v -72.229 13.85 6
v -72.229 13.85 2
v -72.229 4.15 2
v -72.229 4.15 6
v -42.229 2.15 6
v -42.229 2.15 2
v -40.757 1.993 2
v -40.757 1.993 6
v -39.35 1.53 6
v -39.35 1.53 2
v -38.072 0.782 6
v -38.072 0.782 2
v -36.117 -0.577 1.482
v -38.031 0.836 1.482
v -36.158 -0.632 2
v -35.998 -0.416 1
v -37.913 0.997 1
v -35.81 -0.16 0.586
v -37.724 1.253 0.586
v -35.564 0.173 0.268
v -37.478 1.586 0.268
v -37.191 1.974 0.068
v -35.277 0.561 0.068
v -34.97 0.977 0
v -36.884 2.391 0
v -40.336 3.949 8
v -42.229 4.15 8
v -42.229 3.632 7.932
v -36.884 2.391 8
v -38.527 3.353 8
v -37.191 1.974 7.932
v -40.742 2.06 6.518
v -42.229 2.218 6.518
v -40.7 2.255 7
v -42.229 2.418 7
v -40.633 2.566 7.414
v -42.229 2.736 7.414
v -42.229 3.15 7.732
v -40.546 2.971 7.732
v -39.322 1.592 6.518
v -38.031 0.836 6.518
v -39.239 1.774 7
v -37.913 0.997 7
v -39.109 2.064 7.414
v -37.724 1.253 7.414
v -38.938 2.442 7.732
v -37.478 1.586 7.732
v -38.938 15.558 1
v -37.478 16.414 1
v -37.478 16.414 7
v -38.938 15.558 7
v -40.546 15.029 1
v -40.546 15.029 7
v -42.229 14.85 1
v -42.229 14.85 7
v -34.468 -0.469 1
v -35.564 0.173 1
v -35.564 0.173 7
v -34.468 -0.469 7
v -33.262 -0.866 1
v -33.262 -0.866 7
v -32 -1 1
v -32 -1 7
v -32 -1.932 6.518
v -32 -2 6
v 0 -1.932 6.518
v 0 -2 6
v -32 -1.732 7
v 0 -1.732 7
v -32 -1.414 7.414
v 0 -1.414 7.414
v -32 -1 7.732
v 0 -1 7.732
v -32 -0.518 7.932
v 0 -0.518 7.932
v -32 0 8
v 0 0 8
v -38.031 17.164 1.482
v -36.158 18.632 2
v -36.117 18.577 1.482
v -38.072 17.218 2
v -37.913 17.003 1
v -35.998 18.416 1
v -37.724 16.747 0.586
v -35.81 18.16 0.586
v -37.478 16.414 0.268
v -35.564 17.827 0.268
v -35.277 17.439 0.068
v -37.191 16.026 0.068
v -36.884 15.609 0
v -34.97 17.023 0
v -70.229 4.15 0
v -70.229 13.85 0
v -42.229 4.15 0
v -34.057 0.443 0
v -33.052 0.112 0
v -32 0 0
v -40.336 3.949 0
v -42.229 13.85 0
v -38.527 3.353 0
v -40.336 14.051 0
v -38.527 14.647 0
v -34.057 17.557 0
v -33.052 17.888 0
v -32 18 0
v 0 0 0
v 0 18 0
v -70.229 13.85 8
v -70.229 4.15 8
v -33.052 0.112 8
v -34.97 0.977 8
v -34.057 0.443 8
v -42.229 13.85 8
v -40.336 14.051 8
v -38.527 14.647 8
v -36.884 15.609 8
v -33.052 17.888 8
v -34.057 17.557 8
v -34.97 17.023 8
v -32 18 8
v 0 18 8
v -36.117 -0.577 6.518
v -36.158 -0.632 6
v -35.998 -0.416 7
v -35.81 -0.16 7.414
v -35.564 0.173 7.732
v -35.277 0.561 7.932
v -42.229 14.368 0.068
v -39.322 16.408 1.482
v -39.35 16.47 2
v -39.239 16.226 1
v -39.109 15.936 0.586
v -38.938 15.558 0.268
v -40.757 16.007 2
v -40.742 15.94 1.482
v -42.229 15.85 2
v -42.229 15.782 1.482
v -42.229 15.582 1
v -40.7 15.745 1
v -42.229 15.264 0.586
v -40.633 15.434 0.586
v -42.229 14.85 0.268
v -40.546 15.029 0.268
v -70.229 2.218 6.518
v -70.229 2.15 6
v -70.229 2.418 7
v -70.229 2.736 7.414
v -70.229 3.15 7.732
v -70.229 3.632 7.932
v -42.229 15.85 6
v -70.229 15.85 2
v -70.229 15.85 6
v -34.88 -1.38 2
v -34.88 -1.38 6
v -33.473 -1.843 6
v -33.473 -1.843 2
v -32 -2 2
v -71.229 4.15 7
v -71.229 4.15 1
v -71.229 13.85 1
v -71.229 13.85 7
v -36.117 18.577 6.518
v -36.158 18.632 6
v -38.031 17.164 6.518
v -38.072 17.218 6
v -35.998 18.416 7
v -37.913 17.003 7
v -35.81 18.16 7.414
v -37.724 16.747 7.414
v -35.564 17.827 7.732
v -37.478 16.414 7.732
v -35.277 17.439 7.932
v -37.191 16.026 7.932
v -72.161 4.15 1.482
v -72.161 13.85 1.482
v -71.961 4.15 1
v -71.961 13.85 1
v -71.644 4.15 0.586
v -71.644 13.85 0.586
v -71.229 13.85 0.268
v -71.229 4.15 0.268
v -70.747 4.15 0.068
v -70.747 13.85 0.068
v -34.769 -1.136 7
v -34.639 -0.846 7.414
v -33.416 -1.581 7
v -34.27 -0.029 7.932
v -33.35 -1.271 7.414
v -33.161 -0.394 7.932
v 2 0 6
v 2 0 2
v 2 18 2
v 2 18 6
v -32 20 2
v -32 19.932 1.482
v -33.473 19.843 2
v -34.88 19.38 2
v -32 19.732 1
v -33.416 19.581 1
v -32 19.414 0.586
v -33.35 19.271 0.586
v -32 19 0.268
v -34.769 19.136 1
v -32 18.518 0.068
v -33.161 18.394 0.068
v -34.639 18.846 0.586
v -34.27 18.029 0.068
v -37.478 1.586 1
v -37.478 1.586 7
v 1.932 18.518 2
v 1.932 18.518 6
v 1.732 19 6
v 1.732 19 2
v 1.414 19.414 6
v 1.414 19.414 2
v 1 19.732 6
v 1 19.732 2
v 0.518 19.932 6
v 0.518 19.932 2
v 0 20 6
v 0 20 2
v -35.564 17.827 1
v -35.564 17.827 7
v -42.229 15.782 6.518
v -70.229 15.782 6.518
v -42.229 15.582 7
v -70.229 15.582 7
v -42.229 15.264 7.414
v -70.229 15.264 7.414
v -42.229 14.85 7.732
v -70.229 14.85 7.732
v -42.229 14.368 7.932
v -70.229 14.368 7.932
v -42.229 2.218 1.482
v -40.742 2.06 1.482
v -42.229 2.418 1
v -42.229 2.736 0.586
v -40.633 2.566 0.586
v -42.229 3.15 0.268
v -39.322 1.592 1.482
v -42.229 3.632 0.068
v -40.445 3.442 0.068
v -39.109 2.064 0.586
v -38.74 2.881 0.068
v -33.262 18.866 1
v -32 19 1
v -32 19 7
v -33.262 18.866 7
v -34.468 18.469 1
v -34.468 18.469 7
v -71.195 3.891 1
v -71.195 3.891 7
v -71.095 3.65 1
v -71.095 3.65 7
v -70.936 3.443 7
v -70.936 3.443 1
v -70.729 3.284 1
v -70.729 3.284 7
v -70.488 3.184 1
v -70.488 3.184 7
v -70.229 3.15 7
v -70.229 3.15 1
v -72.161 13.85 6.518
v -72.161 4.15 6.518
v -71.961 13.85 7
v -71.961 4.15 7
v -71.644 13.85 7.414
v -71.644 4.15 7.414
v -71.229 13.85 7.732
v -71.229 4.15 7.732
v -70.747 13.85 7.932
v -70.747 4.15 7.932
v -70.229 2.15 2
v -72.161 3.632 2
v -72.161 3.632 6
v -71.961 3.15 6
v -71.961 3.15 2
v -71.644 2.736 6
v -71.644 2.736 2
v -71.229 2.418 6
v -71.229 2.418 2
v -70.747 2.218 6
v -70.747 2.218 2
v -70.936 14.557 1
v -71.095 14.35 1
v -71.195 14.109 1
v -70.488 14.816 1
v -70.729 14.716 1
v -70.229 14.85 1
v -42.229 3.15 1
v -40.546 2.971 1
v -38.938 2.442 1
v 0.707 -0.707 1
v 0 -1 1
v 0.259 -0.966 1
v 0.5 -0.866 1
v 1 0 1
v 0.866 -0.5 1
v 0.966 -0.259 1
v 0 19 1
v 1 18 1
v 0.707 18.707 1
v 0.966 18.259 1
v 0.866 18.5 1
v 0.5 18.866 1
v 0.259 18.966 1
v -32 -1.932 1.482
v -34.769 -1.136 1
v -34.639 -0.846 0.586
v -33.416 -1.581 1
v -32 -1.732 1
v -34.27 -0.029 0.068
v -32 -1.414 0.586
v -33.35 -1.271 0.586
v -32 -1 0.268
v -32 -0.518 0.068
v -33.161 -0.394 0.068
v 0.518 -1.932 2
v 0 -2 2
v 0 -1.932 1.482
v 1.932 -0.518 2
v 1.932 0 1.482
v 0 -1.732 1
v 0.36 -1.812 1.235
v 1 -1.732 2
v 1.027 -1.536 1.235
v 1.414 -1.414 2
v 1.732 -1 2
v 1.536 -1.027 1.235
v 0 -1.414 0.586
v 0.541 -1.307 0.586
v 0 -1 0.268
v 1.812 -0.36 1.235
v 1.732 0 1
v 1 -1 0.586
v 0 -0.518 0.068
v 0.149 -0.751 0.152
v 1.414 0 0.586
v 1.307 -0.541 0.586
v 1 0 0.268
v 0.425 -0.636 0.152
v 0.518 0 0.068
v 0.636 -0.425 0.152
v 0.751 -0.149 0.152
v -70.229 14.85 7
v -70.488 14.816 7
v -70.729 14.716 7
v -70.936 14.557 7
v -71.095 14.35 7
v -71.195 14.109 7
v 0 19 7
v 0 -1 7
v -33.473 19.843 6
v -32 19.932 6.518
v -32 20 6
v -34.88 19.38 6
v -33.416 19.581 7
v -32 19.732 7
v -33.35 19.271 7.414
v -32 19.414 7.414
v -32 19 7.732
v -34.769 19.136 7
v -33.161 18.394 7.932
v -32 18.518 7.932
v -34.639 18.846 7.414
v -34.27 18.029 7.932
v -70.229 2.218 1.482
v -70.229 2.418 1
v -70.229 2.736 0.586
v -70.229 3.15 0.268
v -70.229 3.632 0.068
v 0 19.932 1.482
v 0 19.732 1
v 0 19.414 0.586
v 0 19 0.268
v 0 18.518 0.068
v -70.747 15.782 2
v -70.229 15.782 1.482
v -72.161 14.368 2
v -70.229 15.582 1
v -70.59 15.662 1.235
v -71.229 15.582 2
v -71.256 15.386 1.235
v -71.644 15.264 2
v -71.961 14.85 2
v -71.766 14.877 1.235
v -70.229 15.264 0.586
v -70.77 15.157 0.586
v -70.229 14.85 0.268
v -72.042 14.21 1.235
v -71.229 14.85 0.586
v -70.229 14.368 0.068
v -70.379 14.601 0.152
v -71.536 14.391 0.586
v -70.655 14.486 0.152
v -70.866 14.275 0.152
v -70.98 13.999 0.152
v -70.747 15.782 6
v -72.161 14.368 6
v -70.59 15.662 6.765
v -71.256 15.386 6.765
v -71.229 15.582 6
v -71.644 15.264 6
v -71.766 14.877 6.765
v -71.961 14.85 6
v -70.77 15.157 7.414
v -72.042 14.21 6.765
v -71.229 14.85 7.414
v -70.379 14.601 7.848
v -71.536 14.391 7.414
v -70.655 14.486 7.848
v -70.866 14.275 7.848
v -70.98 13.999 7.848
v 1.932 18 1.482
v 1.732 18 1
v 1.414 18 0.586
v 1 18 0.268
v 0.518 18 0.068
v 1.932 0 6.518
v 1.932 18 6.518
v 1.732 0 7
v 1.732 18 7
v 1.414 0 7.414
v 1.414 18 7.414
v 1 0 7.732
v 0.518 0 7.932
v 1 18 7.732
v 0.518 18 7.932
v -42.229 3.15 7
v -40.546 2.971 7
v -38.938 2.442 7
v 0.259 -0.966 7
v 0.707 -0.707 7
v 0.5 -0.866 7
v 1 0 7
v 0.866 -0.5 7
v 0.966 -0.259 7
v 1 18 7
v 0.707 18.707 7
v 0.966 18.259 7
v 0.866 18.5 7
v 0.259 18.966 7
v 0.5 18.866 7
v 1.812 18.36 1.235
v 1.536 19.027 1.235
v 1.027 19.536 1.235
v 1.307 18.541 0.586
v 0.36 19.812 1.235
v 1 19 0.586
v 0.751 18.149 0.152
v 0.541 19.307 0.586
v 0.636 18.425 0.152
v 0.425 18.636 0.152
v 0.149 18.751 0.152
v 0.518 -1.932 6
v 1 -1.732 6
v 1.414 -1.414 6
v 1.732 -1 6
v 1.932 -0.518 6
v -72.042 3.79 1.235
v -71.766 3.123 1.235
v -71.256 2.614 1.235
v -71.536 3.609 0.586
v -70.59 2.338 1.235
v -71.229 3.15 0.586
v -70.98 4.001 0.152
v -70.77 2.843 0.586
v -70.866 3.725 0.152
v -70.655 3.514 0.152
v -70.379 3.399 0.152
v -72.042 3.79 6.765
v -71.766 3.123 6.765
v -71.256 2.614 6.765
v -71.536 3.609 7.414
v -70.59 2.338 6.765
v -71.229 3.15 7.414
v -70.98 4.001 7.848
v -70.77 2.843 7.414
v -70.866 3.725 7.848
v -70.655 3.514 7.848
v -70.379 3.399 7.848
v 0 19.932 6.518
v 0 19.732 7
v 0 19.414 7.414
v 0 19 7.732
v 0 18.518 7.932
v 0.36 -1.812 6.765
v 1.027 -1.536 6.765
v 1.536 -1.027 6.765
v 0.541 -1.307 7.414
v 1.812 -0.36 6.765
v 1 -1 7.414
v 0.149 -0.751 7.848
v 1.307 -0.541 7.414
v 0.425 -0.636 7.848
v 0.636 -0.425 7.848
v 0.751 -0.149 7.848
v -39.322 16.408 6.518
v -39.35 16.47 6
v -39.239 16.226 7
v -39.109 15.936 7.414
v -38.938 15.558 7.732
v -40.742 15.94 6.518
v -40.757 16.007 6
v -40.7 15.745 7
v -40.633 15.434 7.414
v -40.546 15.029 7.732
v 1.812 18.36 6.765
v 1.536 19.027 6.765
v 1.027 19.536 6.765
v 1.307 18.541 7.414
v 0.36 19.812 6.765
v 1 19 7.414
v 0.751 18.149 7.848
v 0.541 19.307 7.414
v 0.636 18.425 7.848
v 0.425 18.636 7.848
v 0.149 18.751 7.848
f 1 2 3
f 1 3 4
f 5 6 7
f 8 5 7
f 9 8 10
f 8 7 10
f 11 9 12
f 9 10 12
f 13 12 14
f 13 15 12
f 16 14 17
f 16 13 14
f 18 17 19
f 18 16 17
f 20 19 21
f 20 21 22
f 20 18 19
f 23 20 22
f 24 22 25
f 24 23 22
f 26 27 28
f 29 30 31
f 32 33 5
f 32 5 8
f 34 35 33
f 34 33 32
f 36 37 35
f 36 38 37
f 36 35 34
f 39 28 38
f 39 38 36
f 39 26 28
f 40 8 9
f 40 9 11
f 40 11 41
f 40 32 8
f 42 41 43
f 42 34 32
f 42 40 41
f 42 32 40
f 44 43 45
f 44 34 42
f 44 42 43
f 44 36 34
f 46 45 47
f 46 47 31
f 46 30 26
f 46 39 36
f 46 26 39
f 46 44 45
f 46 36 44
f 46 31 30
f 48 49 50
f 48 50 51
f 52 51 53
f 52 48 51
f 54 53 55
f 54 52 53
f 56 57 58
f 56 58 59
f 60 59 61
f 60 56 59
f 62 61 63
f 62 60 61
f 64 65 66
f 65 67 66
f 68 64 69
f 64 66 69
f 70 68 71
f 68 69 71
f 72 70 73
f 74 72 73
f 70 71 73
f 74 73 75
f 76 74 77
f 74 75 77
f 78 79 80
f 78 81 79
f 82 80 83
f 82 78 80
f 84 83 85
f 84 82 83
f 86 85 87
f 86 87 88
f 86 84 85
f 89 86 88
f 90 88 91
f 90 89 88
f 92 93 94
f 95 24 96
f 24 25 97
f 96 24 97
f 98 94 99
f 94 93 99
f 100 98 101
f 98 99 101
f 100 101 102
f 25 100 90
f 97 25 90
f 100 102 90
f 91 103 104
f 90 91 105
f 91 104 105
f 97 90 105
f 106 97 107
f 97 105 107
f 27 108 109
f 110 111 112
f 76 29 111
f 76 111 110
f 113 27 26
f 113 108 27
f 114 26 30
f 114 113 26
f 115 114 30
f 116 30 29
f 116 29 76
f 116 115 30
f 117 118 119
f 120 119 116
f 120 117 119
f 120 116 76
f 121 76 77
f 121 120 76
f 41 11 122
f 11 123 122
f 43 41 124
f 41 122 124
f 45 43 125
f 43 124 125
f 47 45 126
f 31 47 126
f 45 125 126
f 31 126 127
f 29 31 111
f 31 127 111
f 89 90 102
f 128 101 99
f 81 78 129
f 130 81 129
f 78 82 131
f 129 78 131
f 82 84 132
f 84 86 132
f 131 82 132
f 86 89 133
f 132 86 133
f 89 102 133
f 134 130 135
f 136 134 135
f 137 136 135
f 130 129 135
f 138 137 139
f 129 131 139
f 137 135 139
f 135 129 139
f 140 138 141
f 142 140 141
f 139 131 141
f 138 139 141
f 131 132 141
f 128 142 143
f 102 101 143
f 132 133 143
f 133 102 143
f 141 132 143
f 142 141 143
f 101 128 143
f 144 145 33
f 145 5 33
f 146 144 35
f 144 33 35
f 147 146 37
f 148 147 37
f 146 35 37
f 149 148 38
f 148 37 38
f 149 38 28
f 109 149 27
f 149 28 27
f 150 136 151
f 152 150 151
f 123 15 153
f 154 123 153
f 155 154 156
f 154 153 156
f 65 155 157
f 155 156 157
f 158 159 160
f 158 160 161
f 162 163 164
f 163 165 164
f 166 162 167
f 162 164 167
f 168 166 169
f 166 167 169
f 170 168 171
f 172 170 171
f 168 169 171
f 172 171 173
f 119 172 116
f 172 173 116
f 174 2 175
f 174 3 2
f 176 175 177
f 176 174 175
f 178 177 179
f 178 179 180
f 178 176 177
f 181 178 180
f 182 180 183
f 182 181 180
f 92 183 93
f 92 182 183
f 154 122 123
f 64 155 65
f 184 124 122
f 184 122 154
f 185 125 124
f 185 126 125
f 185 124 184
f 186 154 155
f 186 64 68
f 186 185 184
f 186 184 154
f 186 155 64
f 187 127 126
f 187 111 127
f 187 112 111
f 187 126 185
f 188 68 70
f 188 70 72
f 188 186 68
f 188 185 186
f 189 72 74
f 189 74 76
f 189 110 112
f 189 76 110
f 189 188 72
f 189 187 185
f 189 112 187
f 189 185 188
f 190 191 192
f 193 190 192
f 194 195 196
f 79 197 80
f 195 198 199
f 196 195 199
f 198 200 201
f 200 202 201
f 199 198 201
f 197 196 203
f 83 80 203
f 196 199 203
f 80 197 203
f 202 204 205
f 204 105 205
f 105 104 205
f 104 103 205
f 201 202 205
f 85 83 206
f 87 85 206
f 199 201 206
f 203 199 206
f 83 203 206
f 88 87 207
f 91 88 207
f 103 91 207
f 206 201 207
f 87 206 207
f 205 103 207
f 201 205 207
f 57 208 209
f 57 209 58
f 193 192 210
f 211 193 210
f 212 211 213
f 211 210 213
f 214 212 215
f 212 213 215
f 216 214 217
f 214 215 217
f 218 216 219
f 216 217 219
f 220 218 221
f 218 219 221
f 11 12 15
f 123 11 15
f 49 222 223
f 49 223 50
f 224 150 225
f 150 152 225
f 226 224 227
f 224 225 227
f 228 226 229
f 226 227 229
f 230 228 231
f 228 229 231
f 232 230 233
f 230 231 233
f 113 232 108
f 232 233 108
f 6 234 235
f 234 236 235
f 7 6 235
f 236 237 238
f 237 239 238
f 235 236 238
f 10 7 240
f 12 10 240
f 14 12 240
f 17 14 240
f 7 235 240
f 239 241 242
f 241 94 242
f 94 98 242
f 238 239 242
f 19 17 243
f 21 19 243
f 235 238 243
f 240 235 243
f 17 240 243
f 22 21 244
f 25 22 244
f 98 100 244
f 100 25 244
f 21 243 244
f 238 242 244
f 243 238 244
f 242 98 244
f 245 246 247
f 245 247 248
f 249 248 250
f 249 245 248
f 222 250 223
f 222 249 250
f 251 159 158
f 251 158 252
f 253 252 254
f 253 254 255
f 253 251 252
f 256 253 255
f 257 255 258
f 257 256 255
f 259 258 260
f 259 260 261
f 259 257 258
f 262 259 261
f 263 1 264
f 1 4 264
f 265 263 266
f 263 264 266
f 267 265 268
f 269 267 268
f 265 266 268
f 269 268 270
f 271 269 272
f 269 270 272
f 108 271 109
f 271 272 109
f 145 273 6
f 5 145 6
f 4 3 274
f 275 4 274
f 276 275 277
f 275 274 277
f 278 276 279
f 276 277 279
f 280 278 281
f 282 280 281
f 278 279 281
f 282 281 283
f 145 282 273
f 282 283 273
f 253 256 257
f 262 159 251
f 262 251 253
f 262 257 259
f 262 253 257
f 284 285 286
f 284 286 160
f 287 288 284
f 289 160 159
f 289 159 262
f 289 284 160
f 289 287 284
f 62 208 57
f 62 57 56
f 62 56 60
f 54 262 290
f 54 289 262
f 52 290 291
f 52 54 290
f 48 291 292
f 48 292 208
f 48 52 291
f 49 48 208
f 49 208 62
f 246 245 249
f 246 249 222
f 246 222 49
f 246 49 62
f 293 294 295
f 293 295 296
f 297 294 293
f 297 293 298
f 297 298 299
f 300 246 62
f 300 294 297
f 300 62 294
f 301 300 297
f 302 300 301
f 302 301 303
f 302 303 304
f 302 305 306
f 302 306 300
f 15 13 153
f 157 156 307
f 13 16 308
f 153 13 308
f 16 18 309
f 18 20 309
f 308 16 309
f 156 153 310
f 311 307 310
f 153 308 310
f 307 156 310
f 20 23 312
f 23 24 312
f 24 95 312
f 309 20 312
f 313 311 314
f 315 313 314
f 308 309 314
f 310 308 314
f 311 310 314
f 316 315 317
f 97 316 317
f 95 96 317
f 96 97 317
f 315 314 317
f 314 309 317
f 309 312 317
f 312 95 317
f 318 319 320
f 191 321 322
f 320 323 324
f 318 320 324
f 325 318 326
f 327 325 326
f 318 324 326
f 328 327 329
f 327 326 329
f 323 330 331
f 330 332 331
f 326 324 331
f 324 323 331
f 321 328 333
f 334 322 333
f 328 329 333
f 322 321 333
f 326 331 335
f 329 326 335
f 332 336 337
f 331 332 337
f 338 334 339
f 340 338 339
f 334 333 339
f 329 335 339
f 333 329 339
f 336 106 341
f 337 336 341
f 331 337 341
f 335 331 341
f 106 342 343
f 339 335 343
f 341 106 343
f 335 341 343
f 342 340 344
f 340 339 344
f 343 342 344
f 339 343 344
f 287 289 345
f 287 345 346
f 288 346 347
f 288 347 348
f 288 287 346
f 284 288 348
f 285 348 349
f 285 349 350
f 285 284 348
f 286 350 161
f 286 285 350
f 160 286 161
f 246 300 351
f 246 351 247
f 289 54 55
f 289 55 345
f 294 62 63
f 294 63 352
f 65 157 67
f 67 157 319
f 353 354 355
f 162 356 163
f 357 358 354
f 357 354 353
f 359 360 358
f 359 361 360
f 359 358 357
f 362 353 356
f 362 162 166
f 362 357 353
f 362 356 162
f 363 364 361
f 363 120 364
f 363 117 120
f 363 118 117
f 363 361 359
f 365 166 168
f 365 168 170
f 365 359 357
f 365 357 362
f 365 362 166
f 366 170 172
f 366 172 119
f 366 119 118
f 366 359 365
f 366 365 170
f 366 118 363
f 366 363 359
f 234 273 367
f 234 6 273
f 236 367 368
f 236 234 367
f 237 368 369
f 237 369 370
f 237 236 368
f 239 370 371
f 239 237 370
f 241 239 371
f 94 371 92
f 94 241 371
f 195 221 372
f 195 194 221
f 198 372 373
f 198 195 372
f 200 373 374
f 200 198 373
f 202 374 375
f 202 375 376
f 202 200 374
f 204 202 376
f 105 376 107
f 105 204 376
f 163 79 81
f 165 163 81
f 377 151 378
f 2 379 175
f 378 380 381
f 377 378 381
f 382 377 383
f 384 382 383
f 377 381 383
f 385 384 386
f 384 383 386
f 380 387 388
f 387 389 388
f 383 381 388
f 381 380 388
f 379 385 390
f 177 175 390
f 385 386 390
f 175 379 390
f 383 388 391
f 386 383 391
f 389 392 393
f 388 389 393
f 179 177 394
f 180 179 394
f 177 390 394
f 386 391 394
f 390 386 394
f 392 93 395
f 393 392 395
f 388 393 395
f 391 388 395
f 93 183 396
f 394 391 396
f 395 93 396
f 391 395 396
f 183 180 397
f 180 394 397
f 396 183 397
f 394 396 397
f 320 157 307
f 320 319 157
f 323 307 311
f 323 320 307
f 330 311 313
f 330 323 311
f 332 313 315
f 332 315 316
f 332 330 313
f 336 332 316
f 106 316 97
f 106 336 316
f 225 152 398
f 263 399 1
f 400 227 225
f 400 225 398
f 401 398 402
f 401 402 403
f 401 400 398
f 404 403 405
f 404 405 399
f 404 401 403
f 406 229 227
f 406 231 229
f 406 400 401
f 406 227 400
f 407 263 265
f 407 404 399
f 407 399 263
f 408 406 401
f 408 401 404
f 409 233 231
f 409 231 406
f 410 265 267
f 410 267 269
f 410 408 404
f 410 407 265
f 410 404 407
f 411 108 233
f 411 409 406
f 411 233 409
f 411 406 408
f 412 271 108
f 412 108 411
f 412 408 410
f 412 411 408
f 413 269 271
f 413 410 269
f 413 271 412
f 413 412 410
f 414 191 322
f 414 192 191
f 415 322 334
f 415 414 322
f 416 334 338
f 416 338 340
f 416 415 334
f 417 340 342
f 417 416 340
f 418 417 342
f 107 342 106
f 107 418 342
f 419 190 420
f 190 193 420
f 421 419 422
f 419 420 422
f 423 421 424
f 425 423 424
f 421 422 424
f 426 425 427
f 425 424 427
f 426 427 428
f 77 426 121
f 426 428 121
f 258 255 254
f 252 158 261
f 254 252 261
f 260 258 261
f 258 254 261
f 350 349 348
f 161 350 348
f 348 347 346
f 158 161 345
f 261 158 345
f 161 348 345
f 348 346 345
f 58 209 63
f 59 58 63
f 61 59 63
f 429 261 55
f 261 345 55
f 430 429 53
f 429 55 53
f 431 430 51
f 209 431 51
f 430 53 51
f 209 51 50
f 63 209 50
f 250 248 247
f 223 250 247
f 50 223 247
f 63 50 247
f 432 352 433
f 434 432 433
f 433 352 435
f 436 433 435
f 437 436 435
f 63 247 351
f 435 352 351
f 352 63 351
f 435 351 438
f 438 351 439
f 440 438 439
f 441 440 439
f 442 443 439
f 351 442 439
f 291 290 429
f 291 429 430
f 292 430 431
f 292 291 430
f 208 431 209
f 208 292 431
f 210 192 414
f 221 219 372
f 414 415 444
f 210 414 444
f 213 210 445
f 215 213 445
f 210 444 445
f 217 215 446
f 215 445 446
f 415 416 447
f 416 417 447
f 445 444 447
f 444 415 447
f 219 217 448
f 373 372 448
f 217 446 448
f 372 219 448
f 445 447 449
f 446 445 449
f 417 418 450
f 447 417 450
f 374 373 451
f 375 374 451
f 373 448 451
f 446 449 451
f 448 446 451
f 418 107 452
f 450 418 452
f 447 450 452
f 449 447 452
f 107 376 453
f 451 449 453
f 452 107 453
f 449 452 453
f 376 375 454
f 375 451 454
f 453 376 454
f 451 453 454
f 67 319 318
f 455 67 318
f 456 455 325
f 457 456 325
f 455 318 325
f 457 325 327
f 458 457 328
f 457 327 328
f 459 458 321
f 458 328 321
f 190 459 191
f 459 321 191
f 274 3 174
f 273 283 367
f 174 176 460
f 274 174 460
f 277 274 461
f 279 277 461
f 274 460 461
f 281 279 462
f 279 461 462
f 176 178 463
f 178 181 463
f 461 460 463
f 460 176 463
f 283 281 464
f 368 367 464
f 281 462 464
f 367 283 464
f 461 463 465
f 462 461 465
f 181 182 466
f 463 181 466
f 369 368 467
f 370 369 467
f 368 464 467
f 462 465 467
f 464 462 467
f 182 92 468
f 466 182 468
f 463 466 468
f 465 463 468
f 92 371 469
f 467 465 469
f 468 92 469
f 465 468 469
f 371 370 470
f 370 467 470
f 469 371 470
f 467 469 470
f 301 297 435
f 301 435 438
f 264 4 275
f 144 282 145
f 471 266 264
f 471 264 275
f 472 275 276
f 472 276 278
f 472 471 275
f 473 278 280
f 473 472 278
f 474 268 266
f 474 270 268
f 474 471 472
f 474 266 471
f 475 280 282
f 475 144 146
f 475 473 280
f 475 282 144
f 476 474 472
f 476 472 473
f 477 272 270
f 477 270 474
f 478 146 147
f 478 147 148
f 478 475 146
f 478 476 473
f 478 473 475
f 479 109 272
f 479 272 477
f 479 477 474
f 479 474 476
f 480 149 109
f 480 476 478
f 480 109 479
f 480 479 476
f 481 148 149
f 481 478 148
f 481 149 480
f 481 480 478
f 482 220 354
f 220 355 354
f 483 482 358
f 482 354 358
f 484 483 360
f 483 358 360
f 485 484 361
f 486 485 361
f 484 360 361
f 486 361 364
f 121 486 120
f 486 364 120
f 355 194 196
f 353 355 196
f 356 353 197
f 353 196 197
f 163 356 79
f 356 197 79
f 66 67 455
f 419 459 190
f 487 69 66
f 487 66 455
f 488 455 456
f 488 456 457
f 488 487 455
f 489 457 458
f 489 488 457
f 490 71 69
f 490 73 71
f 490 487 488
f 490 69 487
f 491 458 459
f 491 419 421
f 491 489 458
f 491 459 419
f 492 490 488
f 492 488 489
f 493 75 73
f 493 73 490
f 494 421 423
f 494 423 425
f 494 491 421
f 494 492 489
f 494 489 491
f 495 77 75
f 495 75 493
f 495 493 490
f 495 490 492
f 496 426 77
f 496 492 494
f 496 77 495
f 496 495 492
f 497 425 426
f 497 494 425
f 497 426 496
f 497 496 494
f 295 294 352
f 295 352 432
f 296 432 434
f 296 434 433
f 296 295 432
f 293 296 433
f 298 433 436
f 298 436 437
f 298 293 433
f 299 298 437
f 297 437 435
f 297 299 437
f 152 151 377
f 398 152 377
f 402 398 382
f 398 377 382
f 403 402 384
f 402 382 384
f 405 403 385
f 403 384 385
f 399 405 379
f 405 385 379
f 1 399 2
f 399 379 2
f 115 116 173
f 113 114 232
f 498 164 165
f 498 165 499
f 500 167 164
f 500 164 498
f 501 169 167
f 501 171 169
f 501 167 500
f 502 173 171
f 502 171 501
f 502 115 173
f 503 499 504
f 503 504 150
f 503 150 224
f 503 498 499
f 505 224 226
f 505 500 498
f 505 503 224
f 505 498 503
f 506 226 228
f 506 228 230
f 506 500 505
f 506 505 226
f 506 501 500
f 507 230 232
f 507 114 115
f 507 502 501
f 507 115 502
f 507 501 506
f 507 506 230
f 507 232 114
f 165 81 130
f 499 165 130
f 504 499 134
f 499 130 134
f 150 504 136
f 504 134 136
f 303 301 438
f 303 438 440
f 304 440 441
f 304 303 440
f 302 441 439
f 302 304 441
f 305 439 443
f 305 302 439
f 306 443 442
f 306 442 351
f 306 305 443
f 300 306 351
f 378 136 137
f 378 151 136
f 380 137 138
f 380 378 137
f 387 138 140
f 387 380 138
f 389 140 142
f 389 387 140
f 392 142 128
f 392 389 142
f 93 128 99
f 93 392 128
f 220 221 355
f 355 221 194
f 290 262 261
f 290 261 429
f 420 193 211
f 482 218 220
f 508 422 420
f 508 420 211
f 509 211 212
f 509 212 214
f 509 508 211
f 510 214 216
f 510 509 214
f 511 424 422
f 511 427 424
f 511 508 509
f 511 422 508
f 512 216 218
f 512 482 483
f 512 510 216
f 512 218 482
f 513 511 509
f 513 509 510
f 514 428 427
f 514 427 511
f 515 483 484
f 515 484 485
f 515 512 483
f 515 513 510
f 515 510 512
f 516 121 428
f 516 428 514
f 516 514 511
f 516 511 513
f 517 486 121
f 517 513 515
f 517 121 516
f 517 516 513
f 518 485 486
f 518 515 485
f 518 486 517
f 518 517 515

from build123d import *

# Parameters (mm, degrees)
BOSS_EXTRUDE2_DEPTH = 8
SHELL1_START        = 1
SHELL1_DEPTH        = 6
SKETCH5_W           = 6
SKETCH5_H           = 9.7
BOSS_EXTRUDE4_DEPTH = 1
FILLET1_R           = 2


# Read off the part's stored shape, not the designer's step: Shell1
with BuildPart() as part:
    # Sketch2 → Boss-Extrude2 (new body)
    with BuildSketch(Plane.XY):
        with BuildLine():
            Line((0, 20), (-32, 20))
            ThreePointArc((-32, 20), (-34.188489303, 19.649098779), (-36.157566157, 18.631575592))
            Line((-36.157566157, 18.631575592), (-38.071731179, 17.218424408))
            ThreePointArc((-38.071731179, 17.218424408), (-40.040808034, 16.200901221), (-42.229297337, 15.85))
            Line((-42.229297337, 15.85), (-70.229297337, 15.85))
            ThreePointArc((-70.229297337, 15.85), (-71.643510899, 15.264213562), (-72.229297337, 13.85))
            Line((-72.229297337, 13.85), (-72.229297337, 4.15))
            ThreePointArc((-72.229297337, 4.15), (-71.643510899, 2.735786438), (-70.229297337, 2.15))
            Line((-70.229297337, 2.15), (-42.229297337, 2.15))
            ThreePointArc((-42.229297337, 2.15), (-40.040808034, 1.799098779), (-38.071731179, 0.781575592))
            Line((-38.071731179, 0.781575592), (-36.157566157, -0.631575592))
            ThreePointArc((-36.157566157, -0.631575592), (-34.188489303, -1.649098779), (-32, -2))
            Line((-32, -2), (0, -2))
            ThreePointArc((0, -2), (1.414213562, -1.414213562), (2, 0))
            Line((2, 0), (2, 18))
            ThreePointArc((2, 18), (1.414213562, 19.414213562), (0, 20))
        make_face()
    extrude(amount=BOSS_EXTRUDE2_DEPTH)

    # Shell1 outline → Shell1 (cut)
    with BuildSketch(Plane.XY.offset(SHELL1_START)):
        with BuildLine():
            Line((-71.229297337, 13.85), (-72.229297337, 13.85))
            Line((-72.229297337, 13.85), (-72.229297337, 4.15))
            Line((-72.229297337, 4.15), (-71.229297337, 4.15))
            ThreePointArc((-71.229297337, 4.15), (-70.936404118, 3.442893219), (-70.229297337, 3.15))
            Line((-70.229297337, 3.15), (-42.229297337, 3.15))
            ThreePointArc((-42.229297337, 3.15), (-39.728166705, 2.748970033), (-37.477793157, 1.586086391))
            Line((-37.477793157, 1.586086391), (-35.563628135, 0.172935207))
            ThreePointArc((-35.563628135, 0.172935207), (-33.875847974, -0.699227525), (-32, -1))
            Line((-32, -1), (0, -1))
            ThreePointArc((0, -1), (0.707106781, -0.707106781), (1, 0))
            Line((1, 0), (1, 18))
            ThreePointArc((1, 18), (0.707106781, 18.707106781), (0, 19))
            Line((0, 19), (-32, 19))
            ThreePointArc((-32, 19), (-33.875847974, 18.699227525), (-35.563628135, 17.827064793))
            Line((-35.563628135, 17.827064793), (-37.477793157, 16.413913609))
            ThreePointArc((-37.477793157, 16.413913609), (-39.728166705, 15.251029967), (-42.229297337, 14.85))
            Line((-42.229297337, 14.85), (-70.229297337, 14.85))
            ThreePointArc((-70.229297337, 14.85), (-70.936404118, 14.557106781), (-71.229297337, 13.85))
        make_face()
    extrude(amount=SHELL1_DEPTH, mode=Mode.SUBTRACT)

    # Sketch5 → Boss-Extrude4 (add)
    with BuildSketch(Plane.ZY.offset(72.229297337)):
        with Locations((4, 9)):
            Rectangle(SKETCH5_W, SKETCH5_H)
    extrude(amount=-BOSS_EXTRUDE4_DEPTH)

    # Fillet1
    fillet1_edges = [part.edges().sort_by_distance(p)[0] for p in [
        (1.414213562, -1.414213562, 8),
        (2, 9, 8),
        (-37.114648668, 0.075, 0),
        (-40.040808034, 1.799098779, 0),
        (-56.229297337, 2.15, 0),
        (-71.643510899, 2.735786438, 0),
        (-72.229297337, 9, 0),
        (1.414213562, 19.414213562, 8),
        (-71.643510899, 15.264213562, 0),
        (-56.229297337, 15.85, 0),
        (-40.040808034, 16.200901221, 0),
        (-37.114648668, 17.925, 0),
        (-34.188489303, 19.649098779, 0),
        (-16, 20, 0),
        (1.414213562, 19.414213562, 0),
        (2, 9, 0),
        (-16, 20, 8),
        (1.414213562, -1.414213562, 0),
        (-16, -2, 0),
        (-34.188489303, -1.649098779, 0),
        (-34.188489303, 19.649098779, 8),
        (-37.114648668, 17.925, 8),
        (-40.040808034, 16.200901221, 8),
        (-56.229297337, 15.85, 8),
        (-71.643510899, 15.264213562, 8),
        (-72.229297337, 9, 8),
        (-34.188489303, -1.649098779, 8),
        (-71.643510899, 2.735786438, 8),
        (-56.229297337, 2.15, 8),
        (-40.040808034, 1.799098779, 8),
        (-37.114648668, 0.075, 8),
        (-16, -2, 8),
    ]]
    fillet(fillet1_edges, radius=FILLET1_R)


solid = part.part
